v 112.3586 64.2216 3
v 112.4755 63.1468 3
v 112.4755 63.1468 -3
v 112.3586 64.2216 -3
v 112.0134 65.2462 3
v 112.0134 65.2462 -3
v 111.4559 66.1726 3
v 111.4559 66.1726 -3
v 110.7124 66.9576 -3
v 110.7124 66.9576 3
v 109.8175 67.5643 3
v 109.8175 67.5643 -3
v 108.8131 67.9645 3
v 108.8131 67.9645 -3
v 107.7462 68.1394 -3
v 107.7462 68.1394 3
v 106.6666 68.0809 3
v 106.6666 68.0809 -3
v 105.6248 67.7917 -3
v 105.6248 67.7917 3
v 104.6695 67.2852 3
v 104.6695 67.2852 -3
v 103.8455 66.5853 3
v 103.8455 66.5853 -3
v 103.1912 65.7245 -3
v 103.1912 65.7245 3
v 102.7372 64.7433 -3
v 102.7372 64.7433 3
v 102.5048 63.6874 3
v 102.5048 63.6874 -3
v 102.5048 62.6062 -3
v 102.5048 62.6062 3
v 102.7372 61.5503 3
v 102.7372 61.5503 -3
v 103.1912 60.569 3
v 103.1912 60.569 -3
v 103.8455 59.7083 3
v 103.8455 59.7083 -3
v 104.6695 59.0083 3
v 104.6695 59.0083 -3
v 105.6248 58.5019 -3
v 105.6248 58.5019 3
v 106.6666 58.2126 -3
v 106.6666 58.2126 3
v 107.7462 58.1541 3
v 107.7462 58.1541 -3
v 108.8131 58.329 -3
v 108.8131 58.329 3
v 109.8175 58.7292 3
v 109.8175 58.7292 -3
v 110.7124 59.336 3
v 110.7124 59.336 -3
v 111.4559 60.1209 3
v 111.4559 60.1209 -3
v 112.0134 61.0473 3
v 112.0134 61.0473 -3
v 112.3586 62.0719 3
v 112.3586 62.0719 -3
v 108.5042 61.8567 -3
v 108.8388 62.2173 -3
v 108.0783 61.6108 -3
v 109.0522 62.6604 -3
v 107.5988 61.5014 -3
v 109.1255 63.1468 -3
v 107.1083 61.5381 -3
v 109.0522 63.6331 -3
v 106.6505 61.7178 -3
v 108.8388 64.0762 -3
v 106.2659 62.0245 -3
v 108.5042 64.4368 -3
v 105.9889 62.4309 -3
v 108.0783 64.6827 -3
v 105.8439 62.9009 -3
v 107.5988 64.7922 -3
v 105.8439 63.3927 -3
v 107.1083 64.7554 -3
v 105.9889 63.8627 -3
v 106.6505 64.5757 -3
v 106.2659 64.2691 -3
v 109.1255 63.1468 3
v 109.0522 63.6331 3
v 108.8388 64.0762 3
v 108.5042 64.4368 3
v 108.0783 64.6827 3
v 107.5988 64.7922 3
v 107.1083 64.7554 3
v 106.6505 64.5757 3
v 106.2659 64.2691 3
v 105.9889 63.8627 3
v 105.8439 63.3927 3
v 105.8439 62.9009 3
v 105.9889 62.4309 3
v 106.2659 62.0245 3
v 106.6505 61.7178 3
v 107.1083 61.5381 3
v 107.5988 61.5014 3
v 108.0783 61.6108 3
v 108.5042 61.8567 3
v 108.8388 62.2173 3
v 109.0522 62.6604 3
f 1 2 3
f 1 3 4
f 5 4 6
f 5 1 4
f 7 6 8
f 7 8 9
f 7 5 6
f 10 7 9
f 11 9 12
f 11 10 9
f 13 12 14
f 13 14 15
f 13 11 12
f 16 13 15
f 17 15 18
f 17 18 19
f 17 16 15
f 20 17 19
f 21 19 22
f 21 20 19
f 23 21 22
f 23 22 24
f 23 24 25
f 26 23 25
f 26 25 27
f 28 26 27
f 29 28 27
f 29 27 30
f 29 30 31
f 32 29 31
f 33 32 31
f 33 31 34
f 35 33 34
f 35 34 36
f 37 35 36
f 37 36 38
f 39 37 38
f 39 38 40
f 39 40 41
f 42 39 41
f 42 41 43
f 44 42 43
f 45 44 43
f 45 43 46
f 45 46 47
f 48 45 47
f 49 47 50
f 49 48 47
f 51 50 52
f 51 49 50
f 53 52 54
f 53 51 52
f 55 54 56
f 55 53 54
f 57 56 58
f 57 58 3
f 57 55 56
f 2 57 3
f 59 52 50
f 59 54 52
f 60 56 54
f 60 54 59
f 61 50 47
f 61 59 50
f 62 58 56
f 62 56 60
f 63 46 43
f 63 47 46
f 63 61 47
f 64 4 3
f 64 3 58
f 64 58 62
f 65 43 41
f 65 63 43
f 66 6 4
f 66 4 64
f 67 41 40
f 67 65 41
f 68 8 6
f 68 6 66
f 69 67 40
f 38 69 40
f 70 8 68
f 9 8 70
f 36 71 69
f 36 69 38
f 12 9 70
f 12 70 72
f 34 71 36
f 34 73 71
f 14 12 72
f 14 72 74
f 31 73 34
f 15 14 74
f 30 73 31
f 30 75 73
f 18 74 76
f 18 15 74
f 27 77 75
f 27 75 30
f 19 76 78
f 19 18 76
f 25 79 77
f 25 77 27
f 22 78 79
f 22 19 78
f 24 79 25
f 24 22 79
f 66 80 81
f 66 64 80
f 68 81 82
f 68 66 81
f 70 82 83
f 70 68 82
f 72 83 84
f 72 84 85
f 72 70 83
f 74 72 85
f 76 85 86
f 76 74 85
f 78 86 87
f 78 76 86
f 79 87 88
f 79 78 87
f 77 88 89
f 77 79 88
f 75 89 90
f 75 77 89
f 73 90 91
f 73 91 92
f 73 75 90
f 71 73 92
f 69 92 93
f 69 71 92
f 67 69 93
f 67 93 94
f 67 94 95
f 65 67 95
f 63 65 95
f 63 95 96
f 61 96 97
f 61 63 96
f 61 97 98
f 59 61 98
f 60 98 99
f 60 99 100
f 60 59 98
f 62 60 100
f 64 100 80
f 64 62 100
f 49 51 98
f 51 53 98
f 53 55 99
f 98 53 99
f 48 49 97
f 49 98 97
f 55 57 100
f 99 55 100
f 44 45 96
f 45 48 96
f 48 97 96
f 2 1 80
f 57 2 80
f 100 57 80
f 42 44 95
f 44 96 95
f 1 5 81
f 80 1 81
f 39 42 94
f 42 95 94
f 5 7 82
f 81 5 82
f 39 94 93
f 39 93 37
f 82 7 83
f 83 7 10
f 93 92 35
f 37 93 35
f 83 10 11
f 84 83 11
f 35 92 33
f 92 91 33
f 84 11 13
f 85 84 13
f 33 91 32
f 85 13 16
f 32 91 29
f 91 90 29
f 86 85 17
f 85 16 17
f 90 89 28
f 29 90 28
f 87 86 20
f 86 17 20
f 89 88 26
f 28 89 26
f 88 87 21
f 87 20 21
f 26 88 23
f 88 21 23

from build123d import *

# Parameters (mm, degrees)
SKETCH_1_R          = 1.65
EXTRUDE_1_DEPTH     = 3
FILLET_1_R          = 4
FILLET_2_R          = 2
SKETCH_2_R          = 32.383706152
SKETCH_2_R_2        = 5
CUT_EXTRUDE_1_DEPTH = 10


with BuildPart() as part:
    # ｽｹｯﾁ1 → ﾎﾞｽ - 押し出し1 (new, symmetric)
    with BuildSketch(Plane.XY):
        Polygon((103.035796932, 67.586451292), (103.035796932, 78.476037139), (111.915158488, 78.476037139), (111.915158488, 67.586451292), (122.804744336, 67.586451292), (122.804744336, 58.707089735), (111.915158488, 58.707089735), (111.915158488, 47.817503888), (103.035796932, 47.817503888), (103.035796932, 58.707089735), (92.146211085, 58.707089735), (92.146211085, 67.586451292), align=None)
        with Locations((107.47547771, 63.146770513)):
            Circle(SKETCH_1_R, mode=Mode.SUBTRACT)
    extrude(amount=EXTRUDE_1_DEPTH, both=True)

    # ﾌｨﾚｯﾄ1
    fillet_1_edges = [part.edges().sort_by_distance(p)[0] for p in [
        (122.804744336, 67.586451292, 0),
        (111.915158488, 47.817503888, 0),
        (92.146211085, 58.707089735, 0),
        (103.035796932, 78.476037139, 0),
    ]]
    fillet(fillet_1_edges, radius=FILLET_1_R)

    # ﾌｨﾚｯﾄ2
    fillet_2_edges = [part.edges().sort_by_distance(p)[0] for p in [
        (111.915158488, 67.586451292, 0),
        (111.915158488, 58.707089735, 0),
        (103.035796932, 58.707089735, 0),
        (103.035796932, 67.586451292, 0),
    ]]
    fillet(fillet_2_edges, radius=FILLET_2_R)

    # ｽｹｯﾁ2 → ｶｯﾄ - 押し出し1 (cut)
    with BuildSketch(Plane.XY.offset(3)):
        with Locations((107.47547771, 63.146770513)):
            Circle(SKETCH_2_R)
        with BuildLine():
            Line((103.035796932, 47.817503888), (107.915158488, 47.817503888))
            ThreePointArc((107.915158488, 47.817503888), (110.743585613, 48.989076763), (111.915158488, 51.817503888))
            Line((111.915158488, 51.817503888), (111.915158488, 56.707089735))
            ThreePointArc((111.915158488, 56.707089735), (112.500944926, 58.121303298), (113.915158488, 58.707089735))
            Line((113.915158488, 58.707089735), (122.804744336, 58.707089735))
            Line((122.804744336, 58.707089735), (122.804744336, 63.586451292))
            ThreePointArc((122.804744336, 63.586451292), (121.63317146, 66.414878416), (118.804744336, 67.586451292))
            Line((118.804744336, 67.586451292), (113.915158488, 67.586451292))
            ThreePointArc((113.915158488, 67.586451292), (112.500944926, 68.172237729), (111.915158488, 69.586451292))
            Line((111.915158488, 69.586451292), (111.915158488, 78.476037139))
            Line((111.915158488, 78.476037139), (107.035796932, 78.476037139))
            ThreePointArc((107.035796932, 78.476037139), (104.207369807, 77.304464263), (103.035796932, 74.476037139))
            Line((103.035796932, 74.476037139), (103.035796932, 69.586451292))
            ThreePointArc((103.035796932, 69.586451292), (102.450010495, 68.172237729), (101.035796932, 67.586451292))
            Line((101.035796932, 67.586451292), (92.146211085, 67.586451292))
            Line((92.146211085, 67.586451292), (92.146211085, 62.707089735))
            ThreePointArc((92.146211085, 62.707089735), (93.31778396, 59.87866261), (96.146211085, 58.707089735))
            Line((96.146211085, 58.707089735), (101.035796932, 58.707089735))
            ThreePointArc((101.035796932, 58.707089735), (102.450010495, 58.121303298), (103.035796932, 56.707089735))
            Line((103.035796932, 56.707089735), (103.035796932, 47.817503888))
        make_face(mode=Mode.SUBTRACT)
        with BuildLine():
            Line((103.035796932, 56.707089735), (103.035796932, 47.817503888))
            Line((103.035796932, 47.817503888), (107.915158488, 47.817503888))
            ThreePointArc((107.915158488, 47.817503888), (110.743585613, 48.989076763), (111.915158488, 51.817503888))
            Line((111.915158488, 51.817503888), (111.915158488, 56.707089735))
            ThreePointArc((111.915158488, 56.707089735), (112.500944926, 58.121303298), (113.915158488, 58.707089735))
            Line((113.915158488, 58.707089735), (122.804744336, 58.707089735))
            Line((122.804744336, 58.707089735), (122.804744336, 63.586451292))
            ThreePointArc((122.804744336, 63.586451292), (121.63317146, 66.414878416), (118.804744336, 67.586451292))
            Line((118.804744336, 67.586451292), (113.915158488, 67.586451292))
            ThreePointArc((113.915158488, 67.586451292), (112.500944926, 68.172237729), (111.915158488, 69.586451292))
            Line((111.915158488, 69.586451292), (111.915158488, 78.476037139))
            Line((111.915158488, 78.476037139), (107.035796932, 78.476037139))
            ThreePointArc((107.035796932, 78.476037139), (104.207369807, 77.304464263), (103.035796932, 74.476037139))
            Line((103.035796932, 74.476037139), (103.035796932, 69.586451292))
            ThreePointArc((103.035796932, 69.586451292), (102.450010495, 68.172237729), (101.035796932, 67.586451292))
            Line((101.035796932, 67.586451292), (92.146211085, 67.586451292))
            Line((92.146211085, 67.586451292), (92.146211085, 62.707089735))
            ThreePointArc((92.146211085, 62.707089735), (93.31778396, 59.87866261), (96.146211085, 58.707089735))
            Line((96.146211085, 58.707089735), (101.035796932, 58.707089735))
            ThreePointArc((101.035796932, 58.707089735), (102.450010495, 58.121303298), (103.035796932, 56.707089735))
        make_face()
        with Locations((107.47547771, 63.146770513)):
            Circle(SKETCH_2_R_2, mode=Mode.SUBTRACT)
    extrude(amount=-CUT_EXTRUDE_1_DEPTH, mode=Mode.SUBTRACT)


solid = part.part
